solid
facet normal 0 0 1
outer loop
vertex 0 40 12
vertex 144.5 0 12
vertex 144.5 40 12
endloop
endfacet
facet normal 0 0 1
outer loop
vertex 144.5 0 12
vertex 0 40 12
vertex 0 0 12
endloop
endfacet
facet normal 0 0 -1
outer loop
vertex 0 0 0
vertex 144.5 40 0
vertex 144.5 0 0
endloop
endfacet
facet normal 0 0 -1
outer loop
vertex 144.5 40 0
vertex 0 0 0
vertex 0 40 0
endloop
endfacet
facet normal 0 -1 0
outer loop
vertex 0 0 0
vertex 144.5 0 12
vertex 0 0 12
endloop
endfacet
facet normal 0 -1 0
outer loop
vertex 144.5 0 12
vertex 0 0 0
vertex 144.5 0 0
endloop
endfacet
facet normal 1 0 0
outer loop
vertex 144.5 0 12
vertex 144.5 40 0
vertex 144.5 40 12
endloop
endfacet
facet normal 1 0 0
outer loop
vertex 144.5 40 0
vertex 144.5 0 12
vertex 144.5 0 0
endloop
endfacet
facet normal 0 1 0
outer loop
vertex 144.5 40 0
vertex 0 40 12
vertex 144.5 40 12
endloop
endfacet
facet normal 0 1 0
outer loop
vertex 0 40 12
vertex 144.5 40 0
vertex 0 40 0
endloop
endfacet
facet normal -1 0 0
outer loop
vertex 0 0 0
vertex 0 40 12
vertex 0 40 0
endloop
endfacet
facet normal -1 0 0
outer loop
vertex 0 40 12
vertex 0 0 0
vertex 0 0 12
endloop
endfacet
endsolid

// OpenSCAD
length = 144.5;

module main_track()
{
  cube([length, 40, 12]);
}

main_track();
